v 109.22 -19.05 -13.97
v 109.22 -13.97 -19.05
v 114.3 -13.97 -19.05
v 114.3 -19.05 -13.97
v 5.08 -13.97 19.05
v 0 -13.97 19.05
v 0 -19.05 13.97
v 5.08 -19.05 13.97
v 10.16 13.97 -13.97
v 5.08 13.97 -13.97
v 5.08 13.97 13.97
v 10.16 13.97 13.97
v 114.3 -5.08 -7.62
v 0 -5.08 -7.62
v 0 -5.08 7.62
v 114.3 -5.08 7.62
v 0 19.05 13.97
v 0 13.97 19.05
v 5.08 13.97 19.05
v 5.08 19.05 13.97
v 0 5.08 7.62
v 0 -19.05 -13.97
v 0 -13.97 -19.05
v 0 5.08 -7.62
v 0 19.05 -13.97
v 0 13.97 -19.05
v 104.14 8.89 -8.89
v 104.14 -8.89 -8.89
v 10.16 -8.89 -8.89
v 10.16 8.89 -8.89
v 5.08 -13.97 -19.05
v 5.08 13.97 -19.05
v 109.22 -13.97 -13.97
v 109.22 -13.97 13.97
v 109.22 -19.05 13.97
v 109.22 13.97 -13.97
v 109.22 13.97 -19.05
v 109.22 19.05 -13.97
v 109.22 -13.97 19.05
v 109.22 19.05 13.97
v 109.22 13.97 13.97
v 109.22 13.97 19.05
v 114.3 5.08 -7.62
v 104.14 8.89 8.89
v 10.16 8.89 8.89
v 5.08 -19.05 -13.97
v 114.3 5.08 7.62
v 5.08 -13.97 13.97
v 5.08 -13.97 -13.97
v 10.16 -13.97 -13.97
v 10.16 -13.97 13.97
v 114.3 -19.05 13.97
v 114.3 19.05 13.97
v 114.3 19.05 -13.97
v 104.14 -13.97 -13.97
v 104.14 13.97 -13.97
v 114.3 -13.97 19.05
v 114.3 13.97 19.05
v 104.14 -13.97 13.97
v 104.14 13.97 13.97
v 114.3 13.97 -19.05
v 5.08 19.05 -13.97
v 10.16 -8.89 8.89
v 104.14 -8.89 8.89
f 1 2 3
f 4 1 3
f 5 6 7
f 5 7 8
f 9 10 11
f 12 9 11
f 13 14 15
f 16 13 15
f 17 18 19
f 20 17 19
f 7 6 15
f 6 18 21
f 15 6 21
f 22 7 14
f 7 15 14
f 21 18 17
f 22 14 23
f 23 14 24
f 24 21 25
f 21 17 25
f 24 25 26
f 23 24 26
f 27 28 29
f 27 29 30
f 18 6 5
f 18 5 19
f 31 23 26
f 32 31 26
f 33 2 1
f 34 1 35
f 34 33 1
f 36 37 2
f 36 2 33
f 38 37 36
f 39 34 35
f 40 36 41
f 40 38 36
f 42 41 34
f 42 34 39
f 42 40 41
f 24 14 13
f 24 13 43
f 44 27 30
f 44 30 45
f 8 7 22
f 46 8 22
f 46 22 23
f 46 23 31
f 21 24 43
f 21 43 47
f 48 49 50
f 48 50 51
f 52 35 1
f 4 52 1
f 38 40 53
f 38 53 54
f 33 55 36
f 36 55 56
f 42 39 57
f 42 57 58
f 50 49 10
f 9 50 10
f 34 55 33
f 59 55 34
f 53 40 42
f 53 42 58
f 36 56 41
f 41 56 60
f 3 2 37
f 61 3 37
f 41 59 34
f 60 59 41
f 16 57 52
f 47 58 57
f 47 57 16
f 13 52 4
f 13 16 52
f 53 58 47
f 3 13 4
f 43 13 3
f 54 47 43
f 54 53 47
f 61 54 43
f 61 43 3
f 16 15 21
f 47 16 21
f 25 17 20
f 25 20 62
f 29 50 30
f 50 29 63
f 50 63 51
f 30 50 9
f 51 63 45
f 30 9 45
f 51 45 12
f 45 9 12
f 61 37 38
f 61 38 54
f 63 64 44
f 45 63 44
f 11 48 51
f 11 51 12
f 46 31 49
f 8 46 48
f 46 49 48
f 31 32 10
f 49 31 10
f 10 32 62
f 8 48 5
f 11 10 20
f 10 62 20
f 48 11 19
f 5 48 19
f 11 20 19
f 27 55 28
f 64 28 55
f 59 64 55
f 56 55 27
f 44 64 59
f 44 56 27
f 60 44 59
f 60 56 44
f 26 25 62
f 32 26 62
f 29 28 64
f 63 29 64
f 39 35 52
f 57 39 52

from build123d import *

# Parameters (mm, degrees)
SKETCH1_W           = 38.1
SKETCH1_H           = 38.1
BOSS_EXTRUDE1_DEPTH = 114.3
CUT_EXTRUDE1_START  = -5.08
SKETCH3_W           = 38.1
SKETCH3_H           = 38.1
SKETCH3_W_2         = 27.94
SKETCH3_H_2         = 27.94
CUT_EXTRUDE1_DEPTH  = 104.14
CUT_EXTRUDE2_START  = -93.98
SKETCH4_W           = 38.1
SKETCH4_H           = 38.1
SKETCH4_W_2         = 17.78
SKETCH4_H_2         = 17.78
CUT_EXTRUDE2_DEPTH  = 93.98
SKETCH5_W           = 15.24
SKETCH5_H           = 10.16
CUT_EXTRUDE3_DEPTH  = 118.432086757
CHAMFER1_SIZE       = 5.08


with BuildPart() as part:
    # Sketch1 → Boss-Extrude1 (new body)
    with BuildSketch(Plane(origin=(0, 0, 0), x_dir=(0, 0, -1), z_dir=(1, 0, 0))):
        Rectangle(SKETCH1_W, SKETCH1_H)
    extrude(amount=BOSS_EXTRUDE1_DEPTH)

    # Sketch3 → Cut-Extrude1 (cut)
    with BuildSketch(Plane.ZY.offset(CUT_EXTRUDE1_START)):
        Rectangle(SKETCH3_W, SKETCH3_H)
        Rectangle(SKETCH3_W_2, SKETCH3_H_2, mode=Mode.SUBTRACT)
    extrude(amount=-CUT_EXTRUDE1_DEPTH, mode=Mode.SUBTRACT)

    # Sketch4 → Cut-Extrude2 (cut)
    with BuildSketch(Plane.ZY.offset(-10.16).offset(CUT_EXTRUDE2_START)):
        Rectangle(SKETCH4_W, SKETCH4_H)
        Rectangle(SKETCH4_W_2, SKETCH4_H_2, mode=Mode.SUBTRACT)
    extrude(amount=CUT_EXTRUDE2_DEPTH, mode=Mode.SUBTRACT)

    # Sketch5 → Cut-Extrude3 (cut, through all)
    with BuildSketch(Plane.ZY):
        Rectangle(SKETCH5_W, SKETCH5_H)
    extrude(amount=-CUT_EXTRUDE3_DEPTH, mode=Mode.SUBTRACT)

    # Chamfer1
    chamfer1_edges = [part.edges().sort_by_distance(p)[0] for p in [
        (2.54, -19.05, -19.05),
        (2.54, -19.05, 19.05),
        (2.54, 19.05, 19.05),
        (2.54, 19.05, -19.05),
        (111.76, -19.05, -19.05),
        (111.76, -19.05, 19.05),
        (111.76, 19.05, 19.05),
        (111.76, 19.05, -19.05),
    ]]
    chamfer(chamfer1_edges, length=CHAMFER1_SIZE)


solid = part.part
